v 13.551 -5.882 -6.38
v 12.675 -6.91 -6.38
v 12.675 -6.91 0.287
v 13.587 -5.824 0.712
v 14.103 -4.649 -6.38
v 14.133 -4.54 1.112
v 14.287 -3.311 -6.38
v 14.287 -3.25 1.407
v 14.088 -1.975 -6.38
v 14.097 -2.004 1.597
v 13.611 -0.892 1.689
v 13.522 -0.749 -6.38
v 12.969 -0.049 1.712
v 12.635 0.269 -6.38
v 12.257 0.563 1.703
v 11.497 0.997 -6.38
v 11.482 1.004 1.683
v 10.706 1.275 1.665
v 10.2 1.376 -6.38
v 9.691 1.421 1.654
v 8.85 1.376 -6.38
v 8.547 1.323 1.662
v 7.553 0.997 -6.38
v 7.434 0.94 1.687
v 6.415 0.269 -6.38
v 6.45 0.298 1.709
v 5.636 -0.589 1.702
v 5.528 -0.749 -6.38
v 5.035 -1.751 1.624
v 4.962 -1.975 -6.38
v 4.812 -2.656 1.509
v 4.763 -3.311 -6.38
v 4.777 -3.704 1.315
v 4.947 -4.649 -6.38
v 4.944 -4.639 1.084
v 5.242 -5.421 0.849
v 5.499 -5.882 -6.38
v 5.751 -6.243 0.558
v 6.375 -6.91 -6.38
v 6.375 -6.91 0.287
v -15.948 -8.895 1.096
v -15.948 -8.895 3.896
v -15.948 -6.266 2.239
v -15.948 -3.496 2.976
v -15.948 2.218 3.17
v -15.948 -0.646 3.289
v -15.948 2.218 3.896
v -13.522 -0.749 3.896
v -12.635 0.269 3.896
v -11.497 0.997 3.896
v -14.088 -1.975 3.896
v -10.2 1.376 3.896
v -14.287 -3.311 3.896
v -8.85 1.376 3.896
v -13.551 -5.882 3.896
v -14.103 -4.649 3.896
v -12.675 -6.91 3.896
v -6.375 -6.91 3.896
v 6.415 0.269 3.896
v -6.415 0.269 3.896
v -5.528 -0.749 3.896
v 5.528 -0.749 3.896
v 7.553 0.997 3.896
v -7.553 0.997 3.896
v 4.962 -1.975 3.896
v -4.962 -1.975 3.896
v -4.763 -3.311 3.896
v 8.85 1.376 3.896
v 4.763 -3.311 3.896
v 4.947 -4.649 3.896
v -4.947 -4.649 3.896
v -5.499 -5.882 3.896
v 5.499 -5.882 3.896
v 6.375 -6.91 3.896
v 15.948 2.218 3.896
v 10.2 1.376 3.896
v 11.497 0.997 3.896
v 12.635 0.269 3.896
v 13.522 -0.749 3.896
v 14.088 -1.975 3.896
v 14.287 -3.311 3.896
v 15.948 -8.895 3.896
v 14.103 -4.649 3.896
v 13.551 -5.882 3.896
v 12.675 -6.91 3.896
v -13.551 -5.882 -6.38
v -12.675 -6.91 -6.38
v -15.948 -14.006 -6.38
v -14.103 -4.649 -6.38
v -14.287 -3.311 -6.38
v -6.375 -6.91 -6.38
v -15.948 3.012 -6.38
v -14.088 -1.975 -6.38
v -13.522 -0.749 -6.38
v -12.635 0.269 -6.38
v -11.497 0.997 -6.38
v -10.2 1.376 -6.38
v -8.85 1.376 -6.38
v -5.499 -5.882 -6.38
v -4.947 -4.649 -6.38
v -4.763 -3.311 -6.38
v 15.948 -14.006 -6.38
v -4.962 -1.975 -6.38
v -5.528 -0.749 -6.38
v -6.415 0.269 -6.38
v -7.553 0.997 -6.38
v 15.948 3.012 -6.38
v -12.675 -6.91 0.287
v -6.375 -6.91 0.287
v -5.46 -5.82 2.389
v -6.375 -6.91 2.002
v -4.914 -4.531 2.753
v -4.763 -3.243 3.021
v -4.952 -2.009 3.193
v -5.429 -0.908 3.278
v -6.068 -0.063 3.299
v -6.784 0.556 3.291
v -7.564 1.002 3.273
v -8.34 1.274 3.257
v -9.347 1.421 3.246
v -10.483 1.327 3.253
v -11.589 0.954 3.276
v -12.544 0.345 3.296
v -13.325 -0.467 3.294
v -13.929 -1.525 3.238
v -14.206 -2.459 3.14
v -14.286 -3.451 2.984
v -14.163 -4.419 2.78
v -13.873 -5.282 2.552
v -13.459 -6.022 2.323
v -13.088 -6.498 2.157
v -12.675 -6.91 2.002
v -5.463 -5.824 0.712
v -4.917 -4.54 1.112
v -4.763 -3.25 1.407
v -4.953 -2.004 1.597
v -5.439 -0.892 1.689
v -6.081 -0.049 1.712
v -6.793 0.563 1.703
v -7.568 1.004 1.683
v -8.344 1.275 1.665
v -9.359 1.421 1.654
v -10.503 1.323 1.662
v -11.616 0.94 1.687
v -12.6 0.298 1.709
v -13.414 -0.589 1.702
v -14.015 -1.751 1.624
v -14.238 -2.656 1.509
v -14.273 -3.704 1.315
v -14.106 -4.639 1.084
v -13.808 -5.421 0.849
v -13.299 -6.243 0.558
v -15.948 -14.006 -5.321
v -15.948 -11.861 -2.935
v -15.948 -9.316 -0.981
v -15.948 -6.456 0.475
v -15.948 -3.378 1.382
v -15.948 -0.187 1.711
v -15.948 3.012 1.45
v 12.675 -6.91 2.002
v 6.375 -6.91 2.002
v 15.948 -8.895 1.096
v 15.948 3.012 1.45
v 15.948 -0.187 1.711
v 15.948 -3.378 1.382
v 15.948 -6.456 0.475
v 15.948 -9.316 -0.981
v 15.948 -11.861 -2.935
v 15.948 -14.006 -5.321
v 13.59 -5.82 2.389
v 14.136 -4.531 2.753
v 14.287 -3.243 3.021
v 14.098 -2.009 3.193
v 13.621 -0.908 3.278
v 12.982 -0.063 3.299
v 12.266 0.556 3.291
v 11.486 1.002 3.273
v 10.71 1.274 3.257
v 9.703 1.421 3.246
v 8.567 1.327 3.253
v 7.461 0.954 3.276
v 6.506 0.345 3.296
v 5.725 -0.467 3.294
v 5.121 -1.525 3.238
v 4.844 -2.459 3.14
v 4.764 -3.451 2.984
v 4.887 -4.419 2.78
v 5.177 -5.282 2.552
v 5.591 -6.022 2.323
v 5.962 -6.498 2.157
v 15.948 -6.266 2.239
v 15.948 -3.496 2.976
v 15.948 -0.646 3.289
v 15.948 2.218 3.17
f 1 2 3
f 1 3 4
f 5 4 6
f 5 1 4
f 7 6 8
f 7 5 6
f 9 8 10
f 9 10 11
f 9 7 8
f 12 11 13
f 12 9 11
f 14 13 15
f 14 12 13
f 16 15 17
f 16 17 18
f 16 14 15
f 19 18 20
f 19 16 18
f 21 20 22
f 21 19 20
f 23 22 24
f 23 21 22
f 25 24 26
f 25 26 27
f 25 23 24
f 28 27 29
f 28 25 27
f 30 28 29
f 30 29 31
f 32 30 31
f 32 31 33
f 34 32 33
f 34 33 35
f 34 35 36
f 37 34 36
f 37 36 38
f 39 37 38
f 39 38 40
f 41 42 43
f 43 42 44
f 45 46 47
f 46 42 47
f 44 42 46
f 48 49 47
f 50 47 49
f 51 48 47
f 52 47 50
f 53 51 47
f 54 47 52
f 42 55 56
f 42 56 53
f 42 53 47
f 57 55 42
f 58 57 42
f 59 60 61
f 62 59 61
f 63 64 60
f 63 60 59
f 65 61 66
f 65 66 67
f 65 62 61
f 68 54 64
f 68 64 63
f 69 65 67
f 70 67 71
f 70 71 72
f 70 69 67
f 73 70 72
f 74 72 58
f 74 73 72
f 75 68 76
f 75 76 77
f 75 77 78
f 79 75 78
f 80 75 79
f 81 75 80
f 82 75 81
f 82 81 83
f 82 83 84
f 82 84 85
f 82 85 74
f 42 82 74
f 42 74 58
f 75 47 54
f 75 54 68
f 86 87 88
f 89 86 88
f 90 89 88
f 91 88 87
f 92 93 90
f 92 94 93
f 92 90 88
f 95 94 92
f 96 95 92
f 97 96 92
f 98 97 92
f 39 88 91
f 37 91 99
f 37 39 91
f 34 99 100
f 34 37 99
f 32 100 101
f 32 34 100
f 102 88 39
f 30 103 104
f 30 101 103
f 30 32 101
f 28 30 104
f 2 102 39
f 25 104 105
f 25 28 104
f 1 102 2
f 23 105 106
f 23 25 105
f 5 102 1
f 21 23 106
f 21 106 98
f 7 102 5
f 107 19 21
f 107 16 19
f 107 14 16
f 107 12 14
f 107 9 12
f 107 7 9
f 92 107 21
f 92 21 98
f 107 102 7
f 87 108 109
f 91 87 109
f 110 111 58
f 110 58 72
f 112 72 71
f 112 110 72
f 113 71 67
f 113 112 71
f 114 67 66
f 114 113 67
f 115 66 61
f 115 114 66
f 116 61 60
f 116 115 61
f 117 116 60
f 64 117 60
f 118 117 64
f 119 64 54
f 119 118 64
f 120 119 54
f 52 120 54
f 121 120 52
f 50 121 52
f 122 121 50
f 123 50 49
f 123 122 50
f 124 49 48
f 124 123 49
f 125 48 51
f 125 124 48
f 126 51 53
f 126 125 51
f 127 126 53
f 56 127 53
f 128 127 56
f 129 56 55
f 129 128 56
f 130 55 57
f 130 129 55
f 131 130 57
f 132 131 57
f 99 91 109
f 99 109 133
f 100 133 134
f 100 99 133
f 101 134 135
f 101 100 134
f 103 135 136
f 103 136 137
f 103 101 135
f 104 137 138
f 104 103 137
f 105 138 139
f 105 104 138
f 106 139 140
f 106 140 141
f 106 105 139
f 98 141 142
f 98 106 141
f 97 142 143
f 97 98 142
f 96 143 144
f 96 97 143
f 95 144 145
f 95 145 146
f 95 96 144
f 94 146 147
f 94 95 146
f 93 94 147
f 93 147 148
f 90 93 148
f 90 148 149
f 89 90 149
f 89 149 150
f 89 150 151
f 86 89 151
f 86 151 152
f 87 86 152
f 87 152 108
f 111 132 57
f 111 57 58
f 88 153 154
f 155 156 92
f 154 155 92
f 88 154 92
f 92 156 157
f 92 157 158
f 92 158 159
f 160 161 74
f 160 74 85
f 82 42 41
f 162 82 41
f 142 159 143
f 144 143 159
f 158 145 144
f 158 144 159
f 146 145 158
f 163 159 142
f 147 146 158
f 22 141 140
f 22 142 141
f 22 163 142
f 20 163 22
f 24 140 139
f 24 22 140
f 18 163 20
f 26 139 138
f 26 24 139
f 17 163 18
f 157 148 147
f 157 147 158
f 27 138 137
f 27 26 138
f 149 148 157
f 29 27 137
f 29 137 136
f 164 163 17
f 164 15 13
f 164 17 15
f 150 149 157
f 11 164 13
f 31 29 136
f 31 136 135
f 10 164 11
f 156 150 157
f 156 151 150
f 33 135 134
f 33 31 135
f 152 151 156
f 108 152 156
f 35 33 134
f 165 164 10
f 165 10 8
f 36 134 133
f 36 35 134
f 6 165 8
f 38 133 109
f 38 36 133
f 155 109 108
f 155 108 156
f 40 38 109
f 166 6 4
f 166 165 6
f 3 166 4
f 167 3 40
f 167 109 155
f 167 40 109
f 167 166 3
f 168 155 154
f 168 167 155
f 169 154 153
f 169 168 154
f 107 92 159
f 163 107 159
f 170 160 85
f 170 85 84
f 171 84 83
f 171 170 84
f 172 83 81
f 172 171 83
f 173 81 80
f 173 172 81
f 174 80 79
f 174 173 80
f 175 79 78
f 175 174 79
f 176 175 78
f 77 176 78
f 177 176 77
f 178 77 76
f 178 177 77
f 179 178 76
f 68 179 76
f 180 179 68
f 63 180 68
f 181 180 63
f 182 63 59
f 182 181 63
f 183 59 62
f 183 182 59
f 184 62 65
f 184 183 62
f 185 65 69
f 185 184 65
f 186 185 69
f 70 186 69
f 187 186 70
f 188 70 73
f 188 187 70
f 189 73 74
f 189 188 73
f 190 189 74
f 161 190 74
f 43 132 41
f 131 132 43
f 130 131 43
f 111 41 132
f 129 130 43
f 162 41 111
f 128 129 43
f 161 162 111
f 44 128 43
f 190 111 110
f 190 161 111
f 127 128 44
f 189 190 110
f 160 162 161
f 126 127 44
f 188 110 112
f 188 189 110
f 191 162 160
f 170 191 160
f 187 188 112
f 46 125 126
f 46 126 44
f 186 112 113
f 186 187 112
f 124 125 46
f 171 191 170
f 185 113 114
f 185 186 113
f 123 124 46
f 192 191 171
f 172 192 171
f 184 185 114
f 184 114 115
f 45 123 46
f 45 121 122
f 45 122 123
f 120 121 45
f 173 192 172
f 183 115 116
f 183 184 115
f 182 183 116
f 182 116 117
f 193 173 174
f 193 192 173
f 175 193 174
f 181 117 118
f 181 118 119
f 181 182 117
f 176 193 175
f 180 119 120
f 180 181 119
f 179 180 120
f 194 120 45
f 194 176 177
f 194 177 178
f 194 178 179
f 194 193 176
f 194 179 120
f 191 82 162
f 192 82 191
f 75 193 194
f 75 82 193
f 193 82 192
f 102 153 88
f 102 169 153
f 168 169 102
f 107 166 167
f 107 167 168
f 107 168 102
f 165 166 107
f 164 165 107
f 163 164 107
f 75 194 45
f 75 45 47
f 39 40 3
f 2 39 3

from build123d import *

# Parameters (mm, degrees)
F4_DEPTH      = 15.9483520034
F4_DEPTH_BACK = 15.9483520034
F5_DEPTH      = 6.3809299883
F5_DEPTH_BACK = 3.8965306216


with BuildPart() as f4:
    # F2 (on Right) → F4 (new body, two sides)
    with BuildSketch(Plane.YZ) as f4_sk:
        with BuildLine():
            Line((-14.0061716288, -6.3799299883), (3.0117175353, -6.3799299883))
            Line((3.0117175353, -6.3799299883), (3.0117175353, 1.4503391406))
            ThreePointArc((3.0117175353, 1.4503391406), (-6.456282884, 0.474656335), (-14.0061716288, -5.3213913543))
            Line((-14.0061716288, -5.3213913543), (-14.0061716288, -6.3799299883))
        make_face()
    extrude(amount=F4_DEPTH)
    extrude(f4_sk.sketch, amount=-F4_DEPTH_BACK)


with BuildPart() as f4b:
    # F2 (on Right) → F4, piece 2 (new body, two sides)
    with BuildSketch(Plane.YZ) as f4_2_sk:
        with BuildLine():
            Line((-8.8945324647, 3.8955306216), (-8.8945324647, 1.0955733502))
            ThreePointArc((-8.8945324647, 1.0955733502), (-3.4956963756, 2.9760332092), (2.2179675353, 3.1699535819))
            Line((2.2179675353, 3.1699535819), (2.2179675353, 3.8955306216))
            Line((2.2179675353, 3.8955306216), (-8.8945324647, 3.8955306216))
        make_face()
    extrude(amount=F4_DEPTH)
    extrude(f4_2_sk.sketch, amount=-F4_DEPTH_BACK)


with BuildPart() as f5_tool:
    # F3 (on Top) → F5 (new body, two sides)
    with BuildSketch(Plane.XY) as f5_sk:
        with BuildLine():
            ThreePointArc((-6.3749023453, -6.9101574647), (-9.525, 1.4242175353), (-12.6750976547, -6.9101574647))
            Line((-12.6750976547, -6.9101574647), (-6.3749023453, -6.9101574647))
        make_face()
        with BuildLine():
            Line((6.3749023453, -6.9101574647), (12.6750976547, -6.9101574647))
            ThreePointArc((12.6750976547, -6.9101574647), (9.525, 1.4242175353), (6.3749023453, -6.9101574647))
        make_face()
    extrude(amount=-F5_DEPTH)
    extrude(f5_sk.sketch, amount=F5_DEPTH_BACK)


with BuildPart() as f4_1:
    add(f4.part)

    # F5: cut by f5_tool
    add(f5_tool.part, mode=Mode.SUBTRACT)


with BuildPart() as f4b_1:
    add(f4b.part)

    # F5: cut by f5_tool
    add(f5_tool.part, mode=Mode.SUBTRACT)


solid = Compound([f4_1.part, f4b_1.part])
